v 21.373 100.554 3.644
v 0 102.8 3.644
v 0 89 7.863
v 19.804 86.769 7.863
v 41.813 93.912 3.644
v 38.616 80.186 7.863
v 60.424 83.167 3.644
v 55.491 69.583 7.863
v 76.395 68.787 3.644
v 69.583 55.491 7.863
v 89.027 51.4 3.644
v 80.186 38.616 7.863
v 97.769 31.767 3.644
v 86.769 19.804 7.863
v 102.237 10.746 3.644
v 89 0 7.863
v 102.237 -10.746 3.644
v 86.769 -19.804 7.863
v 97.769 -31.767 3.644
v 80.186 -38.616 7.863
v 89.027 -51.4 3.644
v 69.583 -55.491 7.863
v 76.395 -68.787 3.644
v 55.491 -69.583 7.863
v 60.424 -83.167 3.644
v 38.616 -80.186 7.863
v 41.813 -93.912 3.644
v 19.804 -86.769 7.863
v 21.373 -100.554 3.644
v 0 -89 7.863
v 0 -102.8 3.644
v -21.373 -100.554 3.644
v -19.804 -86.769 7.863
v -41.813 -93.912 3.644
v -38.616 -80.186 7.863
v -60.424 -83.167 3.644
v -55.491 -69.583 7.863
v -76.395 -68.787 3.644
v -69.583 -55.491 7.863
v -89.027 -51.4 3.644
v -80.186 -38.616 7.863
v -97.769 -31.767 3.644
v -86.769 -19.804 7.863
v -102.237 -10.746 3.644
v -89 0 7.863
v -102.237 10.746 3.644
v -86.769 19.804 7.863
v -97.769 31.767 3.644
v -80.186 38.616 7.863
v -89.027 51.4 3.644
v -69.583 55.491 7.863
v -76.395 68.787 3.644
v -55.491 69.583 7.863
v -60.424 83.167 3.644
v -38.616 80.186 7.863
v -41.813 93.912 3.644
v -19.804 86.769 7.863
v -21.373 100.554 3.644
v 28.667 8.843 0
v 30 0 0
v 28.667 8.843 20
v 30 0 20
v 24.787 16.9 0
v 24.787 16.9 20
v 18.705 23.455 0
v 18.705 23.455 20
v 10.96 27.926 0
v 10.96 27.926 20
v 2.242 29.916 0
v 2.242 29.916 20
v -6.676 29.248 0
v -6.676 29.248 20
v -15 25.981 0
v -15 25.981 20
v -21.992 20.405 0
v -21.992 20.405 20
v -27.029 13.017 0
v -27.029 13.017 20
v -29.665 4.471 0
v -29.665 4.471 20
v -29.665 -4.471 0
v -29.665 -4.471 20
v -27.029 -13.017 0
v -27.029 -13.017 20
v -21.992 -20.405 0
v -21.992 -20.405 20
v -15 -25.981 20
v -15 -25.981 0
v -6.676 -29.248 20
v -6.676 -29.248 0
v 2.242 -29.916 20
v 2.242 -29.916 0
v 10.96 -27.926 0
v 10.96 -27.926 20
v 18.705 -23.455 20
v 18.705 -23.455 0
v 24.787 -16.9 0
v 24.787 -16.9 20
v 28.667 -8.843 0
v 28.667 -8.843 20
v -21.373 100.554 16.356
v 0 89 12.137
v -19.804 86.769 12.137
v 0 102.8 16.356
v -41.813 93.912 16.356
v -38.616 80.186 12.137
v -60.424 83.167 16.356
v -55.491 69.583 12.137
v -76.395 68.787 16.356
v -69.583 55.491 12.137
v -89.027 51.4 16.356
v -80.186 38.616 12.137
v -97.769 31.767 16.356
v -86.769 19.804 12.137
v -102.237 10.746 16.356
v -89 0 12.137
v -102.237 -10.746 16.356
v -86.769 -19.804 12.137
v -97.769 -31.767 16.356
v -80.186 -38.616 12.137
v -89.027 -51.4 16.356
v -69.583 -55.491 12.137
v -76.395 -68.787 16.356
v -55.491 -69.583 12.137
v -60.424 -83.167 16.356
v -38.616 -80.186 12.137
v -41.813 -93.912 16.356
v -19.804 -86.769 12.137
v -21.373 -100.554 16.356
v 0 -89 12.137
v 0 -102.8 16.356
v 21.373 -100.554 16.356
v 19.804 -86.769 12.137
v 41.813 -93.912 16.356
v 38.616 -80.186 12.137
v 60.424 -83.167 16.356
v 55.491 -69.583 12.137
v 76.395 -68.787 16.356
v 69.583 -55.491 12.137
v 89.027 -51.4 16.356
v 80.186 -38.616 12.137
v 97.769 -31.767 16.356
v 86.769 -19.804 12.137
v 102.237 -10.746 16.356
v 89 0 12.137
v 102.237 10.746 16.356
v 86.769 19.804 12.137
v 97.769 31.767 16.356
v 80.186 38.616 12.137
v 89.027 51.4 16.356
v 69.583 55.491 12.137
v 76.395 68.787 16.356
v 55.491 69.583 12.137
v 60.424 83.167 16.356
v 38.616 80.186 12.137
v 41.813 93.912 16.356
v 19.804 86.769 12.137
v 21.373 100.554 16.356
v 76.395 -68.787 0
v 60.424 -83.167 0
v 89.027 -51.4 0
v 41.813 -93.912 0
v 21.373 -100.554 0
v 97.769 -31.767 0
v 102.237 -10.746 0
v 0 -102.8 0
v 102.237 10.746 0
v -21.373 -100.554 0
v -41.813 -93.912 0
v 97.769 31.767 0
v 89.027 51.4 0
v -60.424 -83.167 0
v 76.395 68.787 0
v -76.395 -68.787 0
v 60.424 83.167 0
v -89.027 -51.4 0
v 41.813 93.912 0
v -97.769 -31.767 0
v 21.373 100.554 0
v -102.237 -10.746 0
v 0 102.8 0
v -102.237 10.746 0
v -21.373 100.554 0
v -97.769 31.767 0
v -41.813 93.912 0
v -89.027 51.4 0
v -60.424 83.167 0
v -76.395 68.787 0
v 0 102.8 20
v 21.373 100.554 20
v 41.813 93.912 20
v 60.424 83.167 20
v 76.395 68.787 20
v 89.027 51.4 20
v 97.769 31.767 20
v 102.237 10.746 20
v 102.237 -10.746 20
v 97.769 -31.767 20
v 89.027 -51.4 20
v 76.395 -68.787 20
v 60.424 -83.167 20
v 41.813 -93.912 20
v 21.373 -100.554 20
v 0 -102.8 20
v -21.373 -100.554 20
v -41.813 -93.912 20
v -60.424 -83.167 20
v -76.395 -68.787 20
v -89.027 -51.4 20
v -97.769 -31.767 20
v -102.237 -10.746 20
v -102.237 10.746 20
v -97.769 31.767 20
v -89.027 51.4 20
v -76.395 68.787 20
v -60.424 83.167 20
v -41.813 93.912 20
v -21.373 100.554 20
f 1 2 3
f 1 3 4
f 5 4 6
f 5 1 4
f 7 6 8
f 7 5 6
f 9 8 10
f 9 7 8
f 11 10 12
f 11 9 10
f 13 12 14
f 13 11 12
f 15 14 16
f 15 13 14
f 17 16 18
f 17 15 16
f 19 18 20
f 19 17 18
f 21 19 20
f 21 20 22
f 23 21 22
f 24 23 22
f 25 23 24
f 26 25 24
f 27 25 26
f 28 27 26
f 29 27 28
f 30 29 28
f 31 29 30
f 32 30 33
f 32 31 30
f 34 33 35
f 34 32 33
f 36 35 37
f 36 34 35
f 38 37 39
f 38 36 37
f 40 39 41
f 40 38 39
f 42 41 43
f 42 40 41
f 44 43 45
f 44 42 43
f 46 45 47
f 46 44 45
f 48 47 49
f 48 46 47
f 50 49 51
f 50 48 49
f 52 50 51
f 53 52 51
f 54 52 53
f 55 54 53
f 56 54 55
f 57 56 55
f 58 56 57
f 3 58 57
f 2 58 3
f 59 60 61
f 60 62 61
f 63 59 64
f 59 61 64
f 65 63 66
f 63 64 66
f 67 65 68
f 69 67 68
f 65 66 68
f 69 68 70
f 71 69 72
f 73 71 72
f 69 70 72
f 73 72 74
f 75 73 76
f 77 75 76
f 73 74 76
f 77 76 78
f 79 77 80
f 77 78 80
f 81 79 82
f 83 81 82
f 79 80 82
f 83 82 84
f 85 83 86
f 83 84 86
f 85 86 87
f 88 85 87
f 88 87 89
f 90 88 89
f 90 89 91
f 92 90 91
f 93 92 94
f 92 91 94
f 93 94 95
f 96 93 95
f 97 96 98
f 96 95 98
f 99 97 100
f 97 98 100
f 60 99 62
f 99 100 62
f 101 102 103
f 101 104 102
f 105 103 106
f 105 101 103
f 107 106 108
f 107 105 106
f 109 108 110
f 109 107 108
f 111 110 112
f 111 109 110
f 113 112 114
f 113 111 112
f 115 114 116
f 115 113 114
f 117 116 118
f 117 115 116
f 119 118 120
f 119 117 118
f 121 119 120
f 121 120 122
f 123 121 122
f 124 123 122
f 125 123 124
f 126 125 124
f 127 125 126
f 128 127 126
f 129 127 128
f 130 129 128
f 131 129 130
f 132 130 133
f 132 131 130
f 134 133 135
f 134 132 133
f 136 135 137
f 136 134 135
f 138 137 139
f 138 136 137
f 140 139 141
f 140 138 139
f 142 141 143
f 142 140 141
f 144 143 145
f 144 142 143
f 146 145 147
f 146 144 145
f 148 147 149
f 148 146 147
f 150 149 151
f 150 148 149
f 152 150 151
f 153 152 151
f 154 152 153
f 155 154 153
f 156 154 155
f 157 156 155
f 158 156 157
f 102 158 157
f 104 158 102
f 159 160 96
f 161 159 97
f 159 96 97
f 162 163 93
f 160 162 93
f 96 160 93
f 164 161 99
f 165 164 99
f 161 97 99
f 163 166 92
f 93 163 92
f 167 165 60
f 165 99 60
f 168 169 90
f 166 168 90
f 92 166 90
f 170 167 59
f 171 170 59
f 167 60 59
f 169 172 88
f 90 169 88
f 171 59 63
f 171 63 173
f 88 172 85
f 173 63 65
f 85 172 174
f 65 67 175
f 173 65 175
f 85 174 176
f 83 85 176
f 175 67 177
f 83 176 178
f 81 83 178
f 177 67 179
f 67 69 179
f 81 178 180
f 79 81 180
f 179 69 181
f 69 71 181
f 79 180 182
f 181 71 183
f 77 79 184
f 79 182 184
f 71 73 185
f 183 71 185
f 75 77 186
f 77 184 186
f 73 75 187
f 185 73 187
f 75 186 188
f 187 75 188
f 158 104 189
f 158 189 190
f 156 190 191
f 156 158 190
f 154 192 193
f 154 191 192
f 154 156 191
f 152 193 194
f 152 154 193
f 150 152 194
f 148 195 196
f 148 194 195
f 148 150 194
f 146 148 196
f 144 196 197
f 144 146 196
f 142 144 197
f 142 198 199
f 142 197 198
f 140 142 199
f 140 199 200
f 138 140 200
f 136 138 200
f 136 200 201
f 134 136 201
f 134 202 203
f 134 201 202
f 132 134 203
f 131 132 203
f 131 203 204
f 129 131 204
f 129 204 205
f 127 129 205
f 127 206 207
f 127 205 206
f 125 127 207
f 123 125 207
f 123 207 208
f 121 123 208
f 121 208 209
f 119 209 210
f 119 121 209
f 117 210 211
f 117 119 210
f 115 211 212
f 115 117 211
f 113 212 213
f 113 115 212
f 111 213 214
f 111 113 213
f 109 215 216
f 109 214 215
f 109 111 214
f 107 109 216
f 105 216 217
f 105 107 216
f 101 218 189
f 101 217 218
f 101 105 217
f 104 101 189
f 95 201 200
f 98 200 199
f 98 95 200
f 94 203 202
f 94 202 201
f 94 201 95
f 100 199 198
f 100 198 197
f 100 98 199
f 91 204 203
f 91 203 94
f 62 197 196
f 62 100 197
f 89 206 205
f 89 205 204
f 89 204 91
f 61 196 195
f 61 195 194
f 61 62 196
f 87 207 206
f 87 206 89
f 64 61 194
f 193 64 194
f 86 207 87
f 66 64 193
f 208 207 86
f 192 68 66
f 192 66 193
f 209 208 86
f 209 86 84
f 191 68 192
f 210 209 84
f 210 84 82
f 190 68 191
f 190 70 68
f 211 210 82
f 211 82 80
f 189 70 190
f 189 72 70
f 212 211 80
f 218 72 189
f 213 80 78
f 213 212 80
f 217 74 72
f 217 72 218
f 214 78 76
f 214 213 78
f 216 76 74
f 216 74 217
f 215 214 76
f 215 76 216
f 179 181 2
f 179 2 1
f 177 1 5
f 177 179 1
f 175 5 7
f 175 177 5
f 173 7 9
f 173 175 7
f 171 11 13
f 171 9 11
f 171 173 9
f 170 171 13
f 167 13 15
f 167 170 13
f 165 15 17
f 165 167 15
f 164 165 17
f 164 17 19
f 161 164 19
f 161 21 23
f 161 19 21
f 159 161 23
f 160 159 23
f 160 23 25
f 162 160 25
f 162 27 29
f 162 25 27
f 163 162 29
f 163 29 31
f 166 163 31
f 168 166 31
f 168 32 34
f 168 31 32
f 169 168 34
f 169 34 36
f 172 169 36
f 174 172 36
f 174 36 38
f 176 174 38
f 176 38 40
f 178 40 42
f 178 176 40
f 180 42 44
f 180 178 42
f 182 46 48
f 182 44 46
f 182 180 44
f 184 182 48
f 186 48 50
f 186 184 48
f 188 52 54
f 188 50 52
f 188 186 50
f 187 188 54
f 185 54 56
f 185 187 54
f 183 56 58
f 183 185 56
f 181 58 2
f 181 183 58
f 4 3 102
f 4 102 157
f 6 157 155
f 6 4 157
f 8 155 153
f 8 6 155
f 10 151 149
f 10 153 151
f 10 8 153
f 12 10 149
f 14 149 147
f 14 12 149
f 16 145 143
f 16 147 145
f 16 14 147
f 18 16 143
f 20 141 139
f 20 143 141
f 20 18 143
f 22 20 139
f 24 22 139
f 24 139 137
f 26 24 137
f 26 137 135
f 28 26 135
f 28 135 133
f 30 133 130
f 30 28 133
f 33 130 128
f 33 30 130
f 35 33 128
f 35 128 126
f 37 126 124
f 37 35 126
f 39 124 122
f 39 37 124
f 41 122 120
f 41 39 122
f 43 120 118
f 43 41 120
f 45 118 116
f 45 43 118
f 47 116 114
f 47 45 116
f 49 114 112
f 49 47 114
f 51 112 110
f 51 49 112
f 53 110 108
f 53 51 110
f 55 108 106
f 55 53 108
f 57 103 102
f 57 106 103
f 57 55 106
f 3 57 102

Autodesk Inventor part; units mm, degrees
ref_plane "YZ Plane" through (0, 0, 0) normal (1, 0, 0) x (0, 1, 0)
ref_plane "XZ Plane" through (0, 0, 0) normal (0, 1, 0) x (-1, 0, 0)
sketch "Boceto principal" plane through (0, 0, 0) normal (1, 0, 0) x (0, 1, 0)
  line L0 (0, 20) -> (102.8, 20)
  line L1 (102.8, 20) -> (102.8, 16.356)
  line L2 (102.8, 16.356) -> (89, 12.137)
  line L3 (89, 12.137) -> (89, 7.863)
  line L4 (89, 7.863) -> (102.8, 3.644)
  line L5 (102.8, 3.644) -> (102.8, 0)
  line L6 (102.8, 0) -> (0, 0)
  line L7 (100, 15.5) -> (100, 4.5) construction
  line L8 (89, 10) -> (100, 10) construction
  line L9 (102.8, 16.356) -> (102.8, 3.644)
  line L10 (0, -4) -> (0, 24) projected
  line L11 (0, 0) -> (0, 20)
  dimension "d0" = 11
  dimension "d1" = 34
  dimension "d2" = 2.8
  dimension "d6" = 20
  dimension "d21" = 200
  dimension "d25" = 13.8
  dimension "d27" = 10
ref_plane "Plano de correa" through (0, 89, 10) normal (0, 0, 1) x (1, 0, 0)
revolve "Cuerpo" add sketch "Boceto principal" angle 360 about axis through (0, 0, -10) along (0, 0, 1)
revolve "Para ranuras" cut sketch "Boceto principal" angle 360 about axis through (0, 0, -10) along (0, 0, 1) contours L9 L4 L3 L2
fillet "Empalme externo" [suppressed]
fillet "Empalme interno" [suppressed]
pattern_of_one "Patrón para ranuras"
sketch "Boceto2" plane through (0, 0, 20) normal (0, 0, 1) x (1, 0, 0)
  circle A0 centre (0, 0) radius 30
  dimension "d28" = 60
extrude "Extrusión1" cut sketch "Boceto2" against normal blind 30
equation "\"d0\" = da_Bw"
equation "\"d1\" = da_Alfa"
equation "\"d2\" = da_c"
equation "\"d21\" = da_Dw"
equation "\"d25\" = da_Hd"
equation "\"d27\" = da_Se"
equation "\"da_r1\" = 0"
equation "\"da_r2\" = 0"
equation "\"d18\" = da_Sg"
equation "\"da_Bw\" = 11"
equation "\"da_Alfa\" = 34deg"
equation "\"da_c\" = 2.8"
equation "\"da_Dw\" = 200"
equation "\"da_Hd\" = 13.8"
equation "\"da_Se\" = 10"
equation "\"da_Sg\" = 15"
properties part number "Polea ranurada2" material "Steel"
